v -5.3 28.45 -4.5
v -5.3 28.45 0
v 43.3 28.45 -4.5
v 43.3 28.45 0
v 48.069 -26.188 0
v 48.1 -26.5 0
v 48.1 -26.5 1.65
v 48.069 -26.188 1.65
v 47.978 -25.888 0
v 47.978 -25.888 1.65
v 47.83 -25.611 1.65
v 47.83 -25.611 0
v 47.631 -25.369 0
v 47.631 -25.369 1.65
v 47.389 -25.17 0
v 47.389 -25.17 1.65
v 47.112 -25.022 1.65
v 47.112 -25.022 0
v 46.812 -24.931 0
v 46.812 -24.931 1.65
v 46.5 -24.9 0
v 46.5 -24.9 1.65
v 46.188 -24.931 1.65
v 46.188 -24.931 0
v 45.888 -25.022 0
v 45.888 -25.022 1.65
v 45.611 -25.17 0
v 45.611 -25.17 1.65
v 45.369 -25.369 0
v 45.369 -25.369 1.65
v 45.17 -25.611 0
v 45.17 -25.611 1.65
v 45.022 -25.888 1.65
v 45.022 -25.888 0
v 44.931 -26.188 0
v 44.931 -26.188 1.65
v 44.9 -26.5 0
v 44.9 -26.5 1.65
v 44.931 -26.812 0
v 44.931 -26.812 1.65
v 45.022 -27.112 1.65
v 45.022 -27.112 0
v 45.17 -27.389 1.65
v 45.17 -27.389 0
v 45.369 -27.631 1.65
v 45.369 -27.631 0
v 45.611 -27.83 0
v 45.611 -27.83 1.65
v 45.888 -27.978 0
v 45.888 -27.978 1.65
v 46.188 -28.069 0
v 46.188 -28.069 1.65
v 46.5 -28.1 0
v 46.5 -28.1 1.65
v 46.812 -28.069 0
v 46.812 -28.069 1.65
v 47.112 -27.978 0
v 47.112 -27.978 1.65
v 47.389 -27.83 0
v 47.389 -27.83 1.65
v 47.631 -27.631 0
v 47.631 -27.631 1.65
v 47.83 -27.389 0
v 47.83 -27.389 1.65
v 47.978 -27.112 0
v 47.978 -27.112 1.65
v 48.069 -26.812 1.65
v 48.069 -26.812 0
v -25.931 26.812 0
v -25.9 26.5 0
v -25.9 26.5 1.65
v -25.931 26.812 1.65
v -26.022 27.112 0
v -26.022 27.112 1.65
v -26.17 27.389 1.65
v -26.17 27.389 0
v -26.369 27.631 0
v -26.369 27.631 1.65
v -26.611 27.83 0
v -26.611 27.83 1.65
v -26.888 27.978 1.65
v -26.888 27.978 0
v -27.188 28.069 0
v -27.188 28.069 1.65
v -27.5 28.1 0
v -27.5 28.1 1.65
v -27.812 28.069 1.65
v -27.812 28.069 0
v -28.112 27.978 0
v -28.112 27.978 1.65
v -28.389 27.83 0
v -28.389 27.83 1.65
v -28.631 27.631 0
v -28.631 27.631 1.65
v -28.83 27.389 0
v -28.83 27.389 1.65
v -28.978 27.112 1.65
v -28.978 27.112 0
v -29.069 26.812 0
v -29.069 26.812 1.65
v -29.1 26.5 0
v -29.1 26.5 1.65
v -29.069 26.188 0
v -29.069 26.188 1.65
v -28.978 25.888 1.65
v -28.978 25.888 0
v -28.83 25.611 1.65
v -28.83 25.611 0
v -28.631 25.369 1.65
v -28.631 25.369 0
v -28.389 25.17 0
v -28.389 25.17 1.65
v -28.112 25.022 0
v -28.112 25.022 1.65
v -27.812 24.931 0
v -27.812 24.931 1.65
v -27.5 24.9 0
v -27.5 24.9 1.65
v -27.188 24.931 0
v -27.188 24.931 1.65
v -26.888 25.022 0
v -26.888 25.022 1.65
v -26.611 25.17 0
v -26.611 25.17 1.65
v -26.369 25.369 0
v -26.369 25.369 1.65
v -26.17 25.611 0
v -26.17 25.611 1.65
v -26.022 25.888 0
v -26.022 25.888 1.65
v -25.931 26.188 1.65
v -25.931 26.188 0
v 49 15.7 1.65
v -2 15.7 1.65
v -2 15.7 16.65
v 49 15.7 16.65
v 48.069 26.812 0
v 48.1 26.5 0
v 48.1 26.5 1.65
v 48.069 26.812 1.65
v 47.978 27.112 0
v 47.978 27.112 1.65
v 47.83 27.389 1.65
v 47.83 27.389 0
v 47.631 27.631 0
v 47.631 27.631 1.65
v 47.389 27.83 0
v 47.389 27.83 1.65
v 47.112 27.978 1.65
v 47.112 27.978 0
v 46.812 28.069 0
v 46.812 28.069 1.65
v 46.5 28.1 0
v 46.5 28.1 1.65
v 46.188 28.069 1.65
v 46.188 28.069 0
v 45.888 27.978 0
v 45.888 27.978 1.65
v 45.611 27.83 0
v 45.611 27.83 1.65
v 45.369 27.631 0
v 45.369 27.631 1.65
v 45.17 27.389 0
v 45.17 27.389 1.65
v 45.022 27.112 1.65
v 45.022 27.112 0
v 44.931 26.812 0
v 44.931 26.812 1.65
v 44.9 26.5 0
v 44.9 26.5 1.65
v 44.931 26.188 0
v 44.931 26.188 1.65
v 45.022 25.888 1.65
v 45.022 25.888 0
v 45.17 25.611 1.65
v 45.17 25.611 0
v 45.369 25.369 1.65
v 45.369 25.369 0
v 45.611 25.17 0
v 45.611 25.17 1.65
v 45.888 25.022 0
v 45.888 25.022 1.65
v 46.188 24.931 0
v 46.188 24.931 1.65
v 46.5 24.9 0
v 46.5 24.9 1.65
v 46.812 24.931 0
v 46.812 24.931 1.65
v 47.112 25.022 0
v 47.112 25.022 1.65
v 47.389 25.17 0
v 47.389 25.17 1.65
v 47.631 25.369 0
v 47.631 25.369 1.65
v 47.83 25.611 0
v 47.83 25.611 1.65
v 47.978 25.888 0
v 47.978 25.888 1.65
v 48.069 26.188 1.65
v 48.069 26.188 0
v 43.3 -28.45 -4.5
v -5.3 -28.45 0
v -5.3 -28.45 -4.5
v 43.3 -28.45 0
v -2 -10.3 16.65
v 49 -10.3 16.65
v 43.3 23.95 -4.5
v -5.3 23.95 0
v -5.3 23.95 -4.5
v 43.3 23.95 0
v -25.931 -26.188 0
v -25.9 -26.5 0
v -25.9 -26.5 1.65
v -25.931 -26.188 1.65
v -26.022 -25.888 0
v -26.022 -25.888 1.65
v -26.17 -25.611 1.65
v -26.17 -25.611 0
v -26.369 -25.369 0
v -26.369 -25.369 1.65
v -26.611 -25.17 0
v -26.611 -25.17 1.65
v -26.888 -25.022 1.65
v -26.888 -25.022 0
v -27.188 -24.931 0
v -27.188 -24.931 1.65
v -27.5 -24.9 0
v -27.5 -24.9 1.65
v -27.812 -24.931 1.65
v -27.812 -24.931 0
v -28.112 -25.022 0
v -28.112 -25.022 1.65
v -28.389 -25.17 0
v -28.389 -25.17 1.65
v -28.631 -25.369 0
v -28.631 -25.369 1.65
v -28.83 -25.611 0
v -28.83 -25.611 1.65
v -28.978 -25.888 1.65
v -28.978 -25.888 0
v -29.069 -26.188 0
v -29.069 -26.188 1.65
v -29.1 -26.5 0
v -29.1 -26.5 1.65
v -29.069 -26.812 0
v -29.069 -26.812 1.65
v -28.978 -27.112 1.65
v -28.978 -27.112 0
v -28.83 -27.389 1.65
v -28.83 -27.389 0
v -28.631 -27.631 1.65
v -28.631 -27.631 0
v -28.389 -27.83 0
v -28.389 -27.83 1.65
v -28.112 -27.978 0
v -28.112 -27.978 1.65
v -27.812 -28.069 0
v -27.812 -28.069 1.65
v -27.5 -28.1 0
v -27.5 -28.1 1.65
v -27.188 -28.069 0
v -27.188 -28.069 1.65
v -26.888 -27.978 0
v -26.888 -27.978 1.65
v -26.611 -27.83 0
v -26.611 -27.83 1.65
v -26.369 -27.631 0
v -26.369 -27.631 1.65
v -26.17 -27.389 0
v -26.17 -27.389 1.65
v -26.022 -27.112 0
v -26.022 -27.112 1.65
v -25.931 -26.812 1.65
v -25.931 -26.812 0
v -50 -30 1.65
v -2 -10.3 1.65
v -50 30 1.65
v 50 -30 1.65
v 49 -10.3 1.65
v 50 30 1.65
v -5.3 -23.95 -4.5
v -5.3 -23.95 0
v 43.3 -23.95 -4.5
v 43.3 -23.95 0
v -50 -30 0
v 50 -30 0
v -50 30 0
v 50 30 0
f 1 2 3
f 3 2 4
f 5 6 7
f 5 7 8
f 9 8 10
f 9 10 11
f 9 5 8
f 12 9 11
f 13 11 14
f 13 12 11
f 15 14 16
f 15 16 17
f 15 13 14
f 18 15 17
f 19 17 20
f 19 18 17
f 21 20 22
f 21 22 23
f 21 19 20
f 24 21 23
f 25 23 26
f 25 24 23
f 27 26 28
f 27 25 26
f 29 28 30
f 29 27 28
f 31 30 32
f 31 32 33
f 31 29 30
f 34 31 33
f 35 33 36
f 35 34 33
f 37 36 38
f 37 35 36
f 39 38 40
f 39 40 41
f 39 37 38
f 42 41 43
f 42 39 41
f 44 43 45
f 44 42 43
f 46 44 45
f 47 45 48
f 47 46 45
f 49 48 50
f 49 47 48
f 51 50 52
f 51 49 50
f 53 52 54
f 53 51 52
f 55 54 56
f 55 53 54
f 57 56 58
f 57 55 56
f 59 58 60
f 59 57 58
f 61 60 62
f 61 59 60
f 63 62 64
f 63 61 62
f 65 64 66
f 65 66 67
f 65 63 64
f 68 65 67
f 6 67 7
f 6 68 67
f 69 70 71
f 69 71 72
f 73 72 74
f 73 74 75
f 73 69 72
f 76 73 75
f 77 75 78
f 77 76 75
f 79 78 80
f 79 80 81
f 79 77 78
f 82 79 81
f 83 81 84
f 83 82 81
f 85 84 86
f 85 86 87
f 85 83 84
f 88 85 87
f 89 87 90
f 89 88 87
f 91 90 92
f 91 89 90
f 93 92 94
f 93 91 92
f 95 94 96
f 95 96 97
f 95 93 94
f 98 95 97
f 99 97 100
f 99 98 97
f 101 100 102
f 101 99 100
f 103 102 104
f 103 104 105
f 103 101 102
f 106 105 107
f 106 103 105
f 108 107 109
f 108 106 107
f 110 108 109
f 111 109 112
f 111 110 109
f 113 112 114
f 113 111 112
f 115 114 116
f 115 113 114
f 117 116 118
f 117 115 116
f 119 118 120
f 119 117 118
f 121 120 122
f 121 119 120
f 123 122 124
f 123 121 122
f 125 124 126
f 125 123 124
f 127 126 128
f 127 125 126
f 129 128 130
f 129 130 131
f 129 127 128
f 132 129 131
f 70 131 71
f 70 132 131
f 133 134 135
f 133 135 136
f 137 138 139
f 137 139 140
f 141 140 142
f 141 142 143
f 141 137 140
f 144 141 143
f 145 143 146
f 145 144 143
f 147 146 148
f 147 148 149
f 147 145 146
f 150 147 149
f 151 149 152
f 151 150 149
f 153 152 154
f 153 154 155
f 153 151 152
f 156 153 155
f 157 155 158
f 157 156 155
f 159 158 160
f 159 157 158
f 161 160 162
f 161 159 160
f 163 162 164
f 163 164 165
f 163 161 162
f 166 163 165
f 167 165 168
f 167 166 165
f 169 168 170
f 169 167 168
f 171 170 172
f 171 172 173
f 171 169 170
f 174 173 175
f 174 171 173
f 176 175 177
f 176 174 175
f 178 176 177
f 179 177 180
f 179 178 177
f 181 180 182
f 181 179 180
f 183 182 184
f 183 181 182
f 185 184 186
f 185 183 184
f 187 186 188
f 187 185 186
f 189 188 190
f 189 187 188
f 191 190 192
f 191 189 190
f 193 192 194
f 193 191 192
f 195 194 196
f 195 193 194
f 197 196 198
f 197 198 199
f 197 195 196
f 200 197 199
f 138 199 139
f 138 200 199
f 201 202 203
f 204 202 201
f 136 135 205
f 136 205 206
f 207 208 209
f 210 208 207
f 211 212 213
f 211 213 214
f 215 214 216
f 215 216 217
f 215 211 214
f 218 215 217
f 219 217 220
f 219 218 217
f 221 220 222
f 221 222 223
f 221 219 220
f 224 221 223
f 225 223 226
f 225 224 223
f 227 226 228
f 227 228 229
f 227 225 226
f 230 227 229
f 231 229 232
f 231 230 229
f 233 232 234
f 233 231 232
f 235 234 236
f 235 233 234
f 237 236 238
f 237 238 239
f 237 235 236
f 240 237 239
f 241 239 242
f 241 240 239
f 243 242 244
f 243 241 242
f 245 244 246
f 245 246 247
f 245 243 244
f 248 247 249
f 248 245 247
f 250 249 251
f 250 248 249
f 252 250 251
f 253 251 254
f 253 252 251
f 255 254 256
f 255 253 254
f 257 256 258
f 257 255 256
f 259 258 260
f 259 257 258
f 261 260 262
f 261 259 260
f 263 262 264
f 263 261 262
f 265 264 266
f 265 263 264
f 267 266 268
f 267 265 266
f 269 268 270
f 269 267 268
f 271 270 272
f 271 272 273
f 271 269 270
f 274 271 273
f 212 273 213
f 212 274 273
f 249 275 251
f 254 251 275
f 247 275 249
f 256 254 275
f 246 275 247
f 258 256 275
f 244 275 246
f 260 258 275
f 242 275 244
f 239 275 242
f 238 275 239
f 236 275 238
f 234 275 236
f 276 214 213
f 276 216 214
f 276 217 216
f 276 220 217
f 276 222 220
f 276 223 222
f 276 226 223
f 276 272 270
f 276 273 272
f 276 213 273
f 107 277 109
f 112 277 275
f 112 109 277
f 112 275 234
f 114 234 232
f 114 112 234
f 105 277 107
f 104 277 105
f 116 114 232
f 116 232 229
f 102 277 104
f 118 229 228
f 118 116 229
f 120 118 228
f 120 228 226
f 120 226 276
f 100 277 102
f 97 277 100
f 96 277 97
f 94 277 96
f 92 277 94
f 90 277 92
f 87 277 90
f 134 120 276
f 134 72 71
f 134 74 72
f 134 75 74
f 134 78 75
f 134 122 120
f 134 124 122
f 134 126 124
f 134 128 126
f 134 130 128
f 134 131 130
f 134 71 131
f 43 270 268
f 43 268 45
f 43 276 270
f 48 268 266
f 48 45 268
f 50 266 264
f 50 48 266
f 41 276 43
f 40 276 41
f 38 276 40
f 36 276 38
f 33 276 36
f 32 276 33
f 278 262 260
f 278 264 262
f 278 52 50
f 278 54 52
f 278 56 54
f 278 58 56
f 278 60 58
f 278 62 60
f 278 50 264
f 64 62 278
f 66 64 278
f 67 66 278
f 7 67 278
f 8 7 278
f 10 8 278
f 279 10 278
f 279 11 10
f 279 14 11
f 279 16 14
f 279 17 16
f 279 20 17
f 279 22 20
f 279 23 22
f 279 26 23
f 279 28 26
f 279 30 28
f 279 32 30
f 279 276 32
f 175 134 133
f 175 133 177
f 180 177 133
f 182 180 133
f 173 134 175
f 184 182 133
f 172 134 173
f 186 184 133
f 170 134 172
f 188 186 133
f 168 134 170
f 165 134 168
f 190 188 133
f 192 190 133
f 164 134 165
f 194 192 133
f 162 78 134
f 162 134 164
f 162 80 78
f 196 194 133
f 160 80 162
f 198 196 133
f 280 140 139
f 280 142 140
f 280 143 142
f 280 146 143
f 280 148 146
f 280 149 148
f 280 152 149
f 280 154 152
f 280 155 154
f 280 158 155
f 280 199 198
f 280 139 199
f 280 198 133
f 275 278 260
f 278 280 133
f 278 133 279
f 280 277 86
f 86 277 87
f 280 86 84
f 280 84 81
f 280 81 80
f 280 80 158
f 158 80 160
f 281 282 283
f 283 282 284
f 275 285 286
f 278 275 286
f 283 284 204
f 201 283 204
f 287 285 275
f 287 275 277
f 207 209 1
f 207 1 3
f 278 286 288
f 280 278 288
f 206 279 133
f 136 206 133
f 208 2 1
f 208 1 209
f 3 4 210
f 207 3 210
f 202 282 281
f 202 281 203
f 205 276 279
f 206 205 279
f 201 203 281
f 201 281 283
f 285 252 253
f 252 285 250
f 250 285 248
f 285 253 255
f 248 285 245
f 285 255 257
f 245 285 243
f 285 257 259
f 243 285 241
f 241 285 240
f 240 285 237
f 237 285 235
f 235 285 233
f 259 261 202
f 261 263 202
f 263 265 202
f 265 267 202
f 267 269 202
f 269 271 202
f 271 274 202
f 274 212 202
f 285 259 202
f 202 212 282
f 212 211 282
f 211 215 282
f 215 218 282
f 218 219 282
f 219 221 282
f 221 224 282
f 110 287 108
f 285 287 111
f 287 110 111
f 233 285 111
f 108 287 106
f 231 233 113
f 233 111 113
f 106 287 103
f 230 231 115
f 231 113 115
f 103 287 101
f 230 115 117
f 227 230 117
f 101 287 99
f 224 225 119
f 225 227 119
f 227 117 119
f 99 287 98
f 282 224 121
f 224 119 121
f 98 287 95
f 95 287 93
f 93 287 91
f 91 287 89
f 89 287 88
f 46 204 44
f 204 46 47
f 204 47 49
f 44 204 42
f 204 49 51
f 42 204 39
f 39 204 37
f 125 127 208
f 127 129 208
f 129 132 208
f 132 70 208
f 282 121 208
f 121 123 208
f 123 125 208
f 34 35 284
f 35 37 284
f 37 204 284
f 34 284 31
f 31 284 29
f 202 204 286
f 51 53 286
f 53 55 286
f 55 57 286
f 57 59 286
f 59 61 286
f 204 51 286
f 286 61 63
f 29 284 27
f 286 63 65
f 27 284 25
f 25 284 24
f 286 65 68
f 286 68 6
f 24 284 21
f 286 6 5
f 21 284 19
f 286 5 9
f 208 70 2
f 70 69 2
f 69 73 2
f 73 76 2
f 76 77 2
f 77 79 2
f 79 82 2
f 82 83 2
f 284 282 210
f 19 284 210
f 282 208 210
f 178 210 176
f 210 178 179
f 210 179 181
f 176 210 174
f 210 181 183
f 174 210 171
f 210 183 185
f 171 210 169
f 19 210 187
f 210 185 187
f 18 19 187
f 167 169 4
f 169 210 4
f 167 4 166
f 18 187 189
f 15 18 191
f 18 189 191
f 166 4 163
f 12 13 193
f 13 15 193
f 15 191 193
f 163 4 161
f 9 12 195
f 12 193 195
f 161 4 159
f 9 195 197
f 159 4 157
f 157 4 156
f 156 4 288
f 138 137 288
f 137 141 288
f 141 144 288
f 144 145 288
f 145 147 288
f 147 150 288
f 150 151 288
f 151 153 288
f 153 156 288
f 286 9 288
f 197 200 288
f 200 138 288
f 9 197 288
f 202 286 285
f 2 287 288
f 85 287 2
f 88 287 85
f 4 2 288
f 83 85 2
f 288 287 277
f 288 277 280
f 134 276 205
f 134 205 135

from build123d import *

# Parameters (mm, degrees)
F0_W     = 100
F0_H     = 60
F0_R     = 1.6
F1_DEPTH = 1.65
F2_W     = 48.6
F2_H     = 4.5
F3_DEPTH = 4.5
F4_W     = 51
F4_H     = 26
F5_DEPTH = 15


with BuildPart() as f1:
    # F0 (on Top) → F1 (new body)
    with BuildSketch(Plane.XY):
        Rectangle(F0_W, F0_H)
        with Locations((-27.5, -26.5)):
            Circle(F0_R, mode=Mode.SUBTRACT)
        with Locations((46.5, -26.5)):
            Circle(F0_R, mode=Mode.SUBTRACT)
        with Locations((-27.5, 26.5)):
            Circle(F0_R, mode=Mode.SUBTRACT)
        with Locations((46.5, 26.5)):
            Circle(F0_R, mode=Mode.SUBTRACT)
    extrude(amount=F1_DEPTH)

    # F2 (on face) → F3 (join)
    with BuildSketch(Plane(origin=(0, 0, 0), x_dir=(1, 0, 0), z_dir=(0, 0, -1))):
        with Locations((19, 26.2)):
            Rectangle(F2_W, F2_H)
        with Locations((19, -26.2)):
            Rectangle(F2_W, F2_H)
    extrude(amount=F3_DEPTH)

    # F4 (on face) → F5 (join)
    with BuildSketch(Plane.XY.offset(1.65)):
        with Locations((23.5, 2.7)):
            Rectangle(F4_W, F4_H)
    extrude(amount=F5_DEPTH)


solid = f1.part
